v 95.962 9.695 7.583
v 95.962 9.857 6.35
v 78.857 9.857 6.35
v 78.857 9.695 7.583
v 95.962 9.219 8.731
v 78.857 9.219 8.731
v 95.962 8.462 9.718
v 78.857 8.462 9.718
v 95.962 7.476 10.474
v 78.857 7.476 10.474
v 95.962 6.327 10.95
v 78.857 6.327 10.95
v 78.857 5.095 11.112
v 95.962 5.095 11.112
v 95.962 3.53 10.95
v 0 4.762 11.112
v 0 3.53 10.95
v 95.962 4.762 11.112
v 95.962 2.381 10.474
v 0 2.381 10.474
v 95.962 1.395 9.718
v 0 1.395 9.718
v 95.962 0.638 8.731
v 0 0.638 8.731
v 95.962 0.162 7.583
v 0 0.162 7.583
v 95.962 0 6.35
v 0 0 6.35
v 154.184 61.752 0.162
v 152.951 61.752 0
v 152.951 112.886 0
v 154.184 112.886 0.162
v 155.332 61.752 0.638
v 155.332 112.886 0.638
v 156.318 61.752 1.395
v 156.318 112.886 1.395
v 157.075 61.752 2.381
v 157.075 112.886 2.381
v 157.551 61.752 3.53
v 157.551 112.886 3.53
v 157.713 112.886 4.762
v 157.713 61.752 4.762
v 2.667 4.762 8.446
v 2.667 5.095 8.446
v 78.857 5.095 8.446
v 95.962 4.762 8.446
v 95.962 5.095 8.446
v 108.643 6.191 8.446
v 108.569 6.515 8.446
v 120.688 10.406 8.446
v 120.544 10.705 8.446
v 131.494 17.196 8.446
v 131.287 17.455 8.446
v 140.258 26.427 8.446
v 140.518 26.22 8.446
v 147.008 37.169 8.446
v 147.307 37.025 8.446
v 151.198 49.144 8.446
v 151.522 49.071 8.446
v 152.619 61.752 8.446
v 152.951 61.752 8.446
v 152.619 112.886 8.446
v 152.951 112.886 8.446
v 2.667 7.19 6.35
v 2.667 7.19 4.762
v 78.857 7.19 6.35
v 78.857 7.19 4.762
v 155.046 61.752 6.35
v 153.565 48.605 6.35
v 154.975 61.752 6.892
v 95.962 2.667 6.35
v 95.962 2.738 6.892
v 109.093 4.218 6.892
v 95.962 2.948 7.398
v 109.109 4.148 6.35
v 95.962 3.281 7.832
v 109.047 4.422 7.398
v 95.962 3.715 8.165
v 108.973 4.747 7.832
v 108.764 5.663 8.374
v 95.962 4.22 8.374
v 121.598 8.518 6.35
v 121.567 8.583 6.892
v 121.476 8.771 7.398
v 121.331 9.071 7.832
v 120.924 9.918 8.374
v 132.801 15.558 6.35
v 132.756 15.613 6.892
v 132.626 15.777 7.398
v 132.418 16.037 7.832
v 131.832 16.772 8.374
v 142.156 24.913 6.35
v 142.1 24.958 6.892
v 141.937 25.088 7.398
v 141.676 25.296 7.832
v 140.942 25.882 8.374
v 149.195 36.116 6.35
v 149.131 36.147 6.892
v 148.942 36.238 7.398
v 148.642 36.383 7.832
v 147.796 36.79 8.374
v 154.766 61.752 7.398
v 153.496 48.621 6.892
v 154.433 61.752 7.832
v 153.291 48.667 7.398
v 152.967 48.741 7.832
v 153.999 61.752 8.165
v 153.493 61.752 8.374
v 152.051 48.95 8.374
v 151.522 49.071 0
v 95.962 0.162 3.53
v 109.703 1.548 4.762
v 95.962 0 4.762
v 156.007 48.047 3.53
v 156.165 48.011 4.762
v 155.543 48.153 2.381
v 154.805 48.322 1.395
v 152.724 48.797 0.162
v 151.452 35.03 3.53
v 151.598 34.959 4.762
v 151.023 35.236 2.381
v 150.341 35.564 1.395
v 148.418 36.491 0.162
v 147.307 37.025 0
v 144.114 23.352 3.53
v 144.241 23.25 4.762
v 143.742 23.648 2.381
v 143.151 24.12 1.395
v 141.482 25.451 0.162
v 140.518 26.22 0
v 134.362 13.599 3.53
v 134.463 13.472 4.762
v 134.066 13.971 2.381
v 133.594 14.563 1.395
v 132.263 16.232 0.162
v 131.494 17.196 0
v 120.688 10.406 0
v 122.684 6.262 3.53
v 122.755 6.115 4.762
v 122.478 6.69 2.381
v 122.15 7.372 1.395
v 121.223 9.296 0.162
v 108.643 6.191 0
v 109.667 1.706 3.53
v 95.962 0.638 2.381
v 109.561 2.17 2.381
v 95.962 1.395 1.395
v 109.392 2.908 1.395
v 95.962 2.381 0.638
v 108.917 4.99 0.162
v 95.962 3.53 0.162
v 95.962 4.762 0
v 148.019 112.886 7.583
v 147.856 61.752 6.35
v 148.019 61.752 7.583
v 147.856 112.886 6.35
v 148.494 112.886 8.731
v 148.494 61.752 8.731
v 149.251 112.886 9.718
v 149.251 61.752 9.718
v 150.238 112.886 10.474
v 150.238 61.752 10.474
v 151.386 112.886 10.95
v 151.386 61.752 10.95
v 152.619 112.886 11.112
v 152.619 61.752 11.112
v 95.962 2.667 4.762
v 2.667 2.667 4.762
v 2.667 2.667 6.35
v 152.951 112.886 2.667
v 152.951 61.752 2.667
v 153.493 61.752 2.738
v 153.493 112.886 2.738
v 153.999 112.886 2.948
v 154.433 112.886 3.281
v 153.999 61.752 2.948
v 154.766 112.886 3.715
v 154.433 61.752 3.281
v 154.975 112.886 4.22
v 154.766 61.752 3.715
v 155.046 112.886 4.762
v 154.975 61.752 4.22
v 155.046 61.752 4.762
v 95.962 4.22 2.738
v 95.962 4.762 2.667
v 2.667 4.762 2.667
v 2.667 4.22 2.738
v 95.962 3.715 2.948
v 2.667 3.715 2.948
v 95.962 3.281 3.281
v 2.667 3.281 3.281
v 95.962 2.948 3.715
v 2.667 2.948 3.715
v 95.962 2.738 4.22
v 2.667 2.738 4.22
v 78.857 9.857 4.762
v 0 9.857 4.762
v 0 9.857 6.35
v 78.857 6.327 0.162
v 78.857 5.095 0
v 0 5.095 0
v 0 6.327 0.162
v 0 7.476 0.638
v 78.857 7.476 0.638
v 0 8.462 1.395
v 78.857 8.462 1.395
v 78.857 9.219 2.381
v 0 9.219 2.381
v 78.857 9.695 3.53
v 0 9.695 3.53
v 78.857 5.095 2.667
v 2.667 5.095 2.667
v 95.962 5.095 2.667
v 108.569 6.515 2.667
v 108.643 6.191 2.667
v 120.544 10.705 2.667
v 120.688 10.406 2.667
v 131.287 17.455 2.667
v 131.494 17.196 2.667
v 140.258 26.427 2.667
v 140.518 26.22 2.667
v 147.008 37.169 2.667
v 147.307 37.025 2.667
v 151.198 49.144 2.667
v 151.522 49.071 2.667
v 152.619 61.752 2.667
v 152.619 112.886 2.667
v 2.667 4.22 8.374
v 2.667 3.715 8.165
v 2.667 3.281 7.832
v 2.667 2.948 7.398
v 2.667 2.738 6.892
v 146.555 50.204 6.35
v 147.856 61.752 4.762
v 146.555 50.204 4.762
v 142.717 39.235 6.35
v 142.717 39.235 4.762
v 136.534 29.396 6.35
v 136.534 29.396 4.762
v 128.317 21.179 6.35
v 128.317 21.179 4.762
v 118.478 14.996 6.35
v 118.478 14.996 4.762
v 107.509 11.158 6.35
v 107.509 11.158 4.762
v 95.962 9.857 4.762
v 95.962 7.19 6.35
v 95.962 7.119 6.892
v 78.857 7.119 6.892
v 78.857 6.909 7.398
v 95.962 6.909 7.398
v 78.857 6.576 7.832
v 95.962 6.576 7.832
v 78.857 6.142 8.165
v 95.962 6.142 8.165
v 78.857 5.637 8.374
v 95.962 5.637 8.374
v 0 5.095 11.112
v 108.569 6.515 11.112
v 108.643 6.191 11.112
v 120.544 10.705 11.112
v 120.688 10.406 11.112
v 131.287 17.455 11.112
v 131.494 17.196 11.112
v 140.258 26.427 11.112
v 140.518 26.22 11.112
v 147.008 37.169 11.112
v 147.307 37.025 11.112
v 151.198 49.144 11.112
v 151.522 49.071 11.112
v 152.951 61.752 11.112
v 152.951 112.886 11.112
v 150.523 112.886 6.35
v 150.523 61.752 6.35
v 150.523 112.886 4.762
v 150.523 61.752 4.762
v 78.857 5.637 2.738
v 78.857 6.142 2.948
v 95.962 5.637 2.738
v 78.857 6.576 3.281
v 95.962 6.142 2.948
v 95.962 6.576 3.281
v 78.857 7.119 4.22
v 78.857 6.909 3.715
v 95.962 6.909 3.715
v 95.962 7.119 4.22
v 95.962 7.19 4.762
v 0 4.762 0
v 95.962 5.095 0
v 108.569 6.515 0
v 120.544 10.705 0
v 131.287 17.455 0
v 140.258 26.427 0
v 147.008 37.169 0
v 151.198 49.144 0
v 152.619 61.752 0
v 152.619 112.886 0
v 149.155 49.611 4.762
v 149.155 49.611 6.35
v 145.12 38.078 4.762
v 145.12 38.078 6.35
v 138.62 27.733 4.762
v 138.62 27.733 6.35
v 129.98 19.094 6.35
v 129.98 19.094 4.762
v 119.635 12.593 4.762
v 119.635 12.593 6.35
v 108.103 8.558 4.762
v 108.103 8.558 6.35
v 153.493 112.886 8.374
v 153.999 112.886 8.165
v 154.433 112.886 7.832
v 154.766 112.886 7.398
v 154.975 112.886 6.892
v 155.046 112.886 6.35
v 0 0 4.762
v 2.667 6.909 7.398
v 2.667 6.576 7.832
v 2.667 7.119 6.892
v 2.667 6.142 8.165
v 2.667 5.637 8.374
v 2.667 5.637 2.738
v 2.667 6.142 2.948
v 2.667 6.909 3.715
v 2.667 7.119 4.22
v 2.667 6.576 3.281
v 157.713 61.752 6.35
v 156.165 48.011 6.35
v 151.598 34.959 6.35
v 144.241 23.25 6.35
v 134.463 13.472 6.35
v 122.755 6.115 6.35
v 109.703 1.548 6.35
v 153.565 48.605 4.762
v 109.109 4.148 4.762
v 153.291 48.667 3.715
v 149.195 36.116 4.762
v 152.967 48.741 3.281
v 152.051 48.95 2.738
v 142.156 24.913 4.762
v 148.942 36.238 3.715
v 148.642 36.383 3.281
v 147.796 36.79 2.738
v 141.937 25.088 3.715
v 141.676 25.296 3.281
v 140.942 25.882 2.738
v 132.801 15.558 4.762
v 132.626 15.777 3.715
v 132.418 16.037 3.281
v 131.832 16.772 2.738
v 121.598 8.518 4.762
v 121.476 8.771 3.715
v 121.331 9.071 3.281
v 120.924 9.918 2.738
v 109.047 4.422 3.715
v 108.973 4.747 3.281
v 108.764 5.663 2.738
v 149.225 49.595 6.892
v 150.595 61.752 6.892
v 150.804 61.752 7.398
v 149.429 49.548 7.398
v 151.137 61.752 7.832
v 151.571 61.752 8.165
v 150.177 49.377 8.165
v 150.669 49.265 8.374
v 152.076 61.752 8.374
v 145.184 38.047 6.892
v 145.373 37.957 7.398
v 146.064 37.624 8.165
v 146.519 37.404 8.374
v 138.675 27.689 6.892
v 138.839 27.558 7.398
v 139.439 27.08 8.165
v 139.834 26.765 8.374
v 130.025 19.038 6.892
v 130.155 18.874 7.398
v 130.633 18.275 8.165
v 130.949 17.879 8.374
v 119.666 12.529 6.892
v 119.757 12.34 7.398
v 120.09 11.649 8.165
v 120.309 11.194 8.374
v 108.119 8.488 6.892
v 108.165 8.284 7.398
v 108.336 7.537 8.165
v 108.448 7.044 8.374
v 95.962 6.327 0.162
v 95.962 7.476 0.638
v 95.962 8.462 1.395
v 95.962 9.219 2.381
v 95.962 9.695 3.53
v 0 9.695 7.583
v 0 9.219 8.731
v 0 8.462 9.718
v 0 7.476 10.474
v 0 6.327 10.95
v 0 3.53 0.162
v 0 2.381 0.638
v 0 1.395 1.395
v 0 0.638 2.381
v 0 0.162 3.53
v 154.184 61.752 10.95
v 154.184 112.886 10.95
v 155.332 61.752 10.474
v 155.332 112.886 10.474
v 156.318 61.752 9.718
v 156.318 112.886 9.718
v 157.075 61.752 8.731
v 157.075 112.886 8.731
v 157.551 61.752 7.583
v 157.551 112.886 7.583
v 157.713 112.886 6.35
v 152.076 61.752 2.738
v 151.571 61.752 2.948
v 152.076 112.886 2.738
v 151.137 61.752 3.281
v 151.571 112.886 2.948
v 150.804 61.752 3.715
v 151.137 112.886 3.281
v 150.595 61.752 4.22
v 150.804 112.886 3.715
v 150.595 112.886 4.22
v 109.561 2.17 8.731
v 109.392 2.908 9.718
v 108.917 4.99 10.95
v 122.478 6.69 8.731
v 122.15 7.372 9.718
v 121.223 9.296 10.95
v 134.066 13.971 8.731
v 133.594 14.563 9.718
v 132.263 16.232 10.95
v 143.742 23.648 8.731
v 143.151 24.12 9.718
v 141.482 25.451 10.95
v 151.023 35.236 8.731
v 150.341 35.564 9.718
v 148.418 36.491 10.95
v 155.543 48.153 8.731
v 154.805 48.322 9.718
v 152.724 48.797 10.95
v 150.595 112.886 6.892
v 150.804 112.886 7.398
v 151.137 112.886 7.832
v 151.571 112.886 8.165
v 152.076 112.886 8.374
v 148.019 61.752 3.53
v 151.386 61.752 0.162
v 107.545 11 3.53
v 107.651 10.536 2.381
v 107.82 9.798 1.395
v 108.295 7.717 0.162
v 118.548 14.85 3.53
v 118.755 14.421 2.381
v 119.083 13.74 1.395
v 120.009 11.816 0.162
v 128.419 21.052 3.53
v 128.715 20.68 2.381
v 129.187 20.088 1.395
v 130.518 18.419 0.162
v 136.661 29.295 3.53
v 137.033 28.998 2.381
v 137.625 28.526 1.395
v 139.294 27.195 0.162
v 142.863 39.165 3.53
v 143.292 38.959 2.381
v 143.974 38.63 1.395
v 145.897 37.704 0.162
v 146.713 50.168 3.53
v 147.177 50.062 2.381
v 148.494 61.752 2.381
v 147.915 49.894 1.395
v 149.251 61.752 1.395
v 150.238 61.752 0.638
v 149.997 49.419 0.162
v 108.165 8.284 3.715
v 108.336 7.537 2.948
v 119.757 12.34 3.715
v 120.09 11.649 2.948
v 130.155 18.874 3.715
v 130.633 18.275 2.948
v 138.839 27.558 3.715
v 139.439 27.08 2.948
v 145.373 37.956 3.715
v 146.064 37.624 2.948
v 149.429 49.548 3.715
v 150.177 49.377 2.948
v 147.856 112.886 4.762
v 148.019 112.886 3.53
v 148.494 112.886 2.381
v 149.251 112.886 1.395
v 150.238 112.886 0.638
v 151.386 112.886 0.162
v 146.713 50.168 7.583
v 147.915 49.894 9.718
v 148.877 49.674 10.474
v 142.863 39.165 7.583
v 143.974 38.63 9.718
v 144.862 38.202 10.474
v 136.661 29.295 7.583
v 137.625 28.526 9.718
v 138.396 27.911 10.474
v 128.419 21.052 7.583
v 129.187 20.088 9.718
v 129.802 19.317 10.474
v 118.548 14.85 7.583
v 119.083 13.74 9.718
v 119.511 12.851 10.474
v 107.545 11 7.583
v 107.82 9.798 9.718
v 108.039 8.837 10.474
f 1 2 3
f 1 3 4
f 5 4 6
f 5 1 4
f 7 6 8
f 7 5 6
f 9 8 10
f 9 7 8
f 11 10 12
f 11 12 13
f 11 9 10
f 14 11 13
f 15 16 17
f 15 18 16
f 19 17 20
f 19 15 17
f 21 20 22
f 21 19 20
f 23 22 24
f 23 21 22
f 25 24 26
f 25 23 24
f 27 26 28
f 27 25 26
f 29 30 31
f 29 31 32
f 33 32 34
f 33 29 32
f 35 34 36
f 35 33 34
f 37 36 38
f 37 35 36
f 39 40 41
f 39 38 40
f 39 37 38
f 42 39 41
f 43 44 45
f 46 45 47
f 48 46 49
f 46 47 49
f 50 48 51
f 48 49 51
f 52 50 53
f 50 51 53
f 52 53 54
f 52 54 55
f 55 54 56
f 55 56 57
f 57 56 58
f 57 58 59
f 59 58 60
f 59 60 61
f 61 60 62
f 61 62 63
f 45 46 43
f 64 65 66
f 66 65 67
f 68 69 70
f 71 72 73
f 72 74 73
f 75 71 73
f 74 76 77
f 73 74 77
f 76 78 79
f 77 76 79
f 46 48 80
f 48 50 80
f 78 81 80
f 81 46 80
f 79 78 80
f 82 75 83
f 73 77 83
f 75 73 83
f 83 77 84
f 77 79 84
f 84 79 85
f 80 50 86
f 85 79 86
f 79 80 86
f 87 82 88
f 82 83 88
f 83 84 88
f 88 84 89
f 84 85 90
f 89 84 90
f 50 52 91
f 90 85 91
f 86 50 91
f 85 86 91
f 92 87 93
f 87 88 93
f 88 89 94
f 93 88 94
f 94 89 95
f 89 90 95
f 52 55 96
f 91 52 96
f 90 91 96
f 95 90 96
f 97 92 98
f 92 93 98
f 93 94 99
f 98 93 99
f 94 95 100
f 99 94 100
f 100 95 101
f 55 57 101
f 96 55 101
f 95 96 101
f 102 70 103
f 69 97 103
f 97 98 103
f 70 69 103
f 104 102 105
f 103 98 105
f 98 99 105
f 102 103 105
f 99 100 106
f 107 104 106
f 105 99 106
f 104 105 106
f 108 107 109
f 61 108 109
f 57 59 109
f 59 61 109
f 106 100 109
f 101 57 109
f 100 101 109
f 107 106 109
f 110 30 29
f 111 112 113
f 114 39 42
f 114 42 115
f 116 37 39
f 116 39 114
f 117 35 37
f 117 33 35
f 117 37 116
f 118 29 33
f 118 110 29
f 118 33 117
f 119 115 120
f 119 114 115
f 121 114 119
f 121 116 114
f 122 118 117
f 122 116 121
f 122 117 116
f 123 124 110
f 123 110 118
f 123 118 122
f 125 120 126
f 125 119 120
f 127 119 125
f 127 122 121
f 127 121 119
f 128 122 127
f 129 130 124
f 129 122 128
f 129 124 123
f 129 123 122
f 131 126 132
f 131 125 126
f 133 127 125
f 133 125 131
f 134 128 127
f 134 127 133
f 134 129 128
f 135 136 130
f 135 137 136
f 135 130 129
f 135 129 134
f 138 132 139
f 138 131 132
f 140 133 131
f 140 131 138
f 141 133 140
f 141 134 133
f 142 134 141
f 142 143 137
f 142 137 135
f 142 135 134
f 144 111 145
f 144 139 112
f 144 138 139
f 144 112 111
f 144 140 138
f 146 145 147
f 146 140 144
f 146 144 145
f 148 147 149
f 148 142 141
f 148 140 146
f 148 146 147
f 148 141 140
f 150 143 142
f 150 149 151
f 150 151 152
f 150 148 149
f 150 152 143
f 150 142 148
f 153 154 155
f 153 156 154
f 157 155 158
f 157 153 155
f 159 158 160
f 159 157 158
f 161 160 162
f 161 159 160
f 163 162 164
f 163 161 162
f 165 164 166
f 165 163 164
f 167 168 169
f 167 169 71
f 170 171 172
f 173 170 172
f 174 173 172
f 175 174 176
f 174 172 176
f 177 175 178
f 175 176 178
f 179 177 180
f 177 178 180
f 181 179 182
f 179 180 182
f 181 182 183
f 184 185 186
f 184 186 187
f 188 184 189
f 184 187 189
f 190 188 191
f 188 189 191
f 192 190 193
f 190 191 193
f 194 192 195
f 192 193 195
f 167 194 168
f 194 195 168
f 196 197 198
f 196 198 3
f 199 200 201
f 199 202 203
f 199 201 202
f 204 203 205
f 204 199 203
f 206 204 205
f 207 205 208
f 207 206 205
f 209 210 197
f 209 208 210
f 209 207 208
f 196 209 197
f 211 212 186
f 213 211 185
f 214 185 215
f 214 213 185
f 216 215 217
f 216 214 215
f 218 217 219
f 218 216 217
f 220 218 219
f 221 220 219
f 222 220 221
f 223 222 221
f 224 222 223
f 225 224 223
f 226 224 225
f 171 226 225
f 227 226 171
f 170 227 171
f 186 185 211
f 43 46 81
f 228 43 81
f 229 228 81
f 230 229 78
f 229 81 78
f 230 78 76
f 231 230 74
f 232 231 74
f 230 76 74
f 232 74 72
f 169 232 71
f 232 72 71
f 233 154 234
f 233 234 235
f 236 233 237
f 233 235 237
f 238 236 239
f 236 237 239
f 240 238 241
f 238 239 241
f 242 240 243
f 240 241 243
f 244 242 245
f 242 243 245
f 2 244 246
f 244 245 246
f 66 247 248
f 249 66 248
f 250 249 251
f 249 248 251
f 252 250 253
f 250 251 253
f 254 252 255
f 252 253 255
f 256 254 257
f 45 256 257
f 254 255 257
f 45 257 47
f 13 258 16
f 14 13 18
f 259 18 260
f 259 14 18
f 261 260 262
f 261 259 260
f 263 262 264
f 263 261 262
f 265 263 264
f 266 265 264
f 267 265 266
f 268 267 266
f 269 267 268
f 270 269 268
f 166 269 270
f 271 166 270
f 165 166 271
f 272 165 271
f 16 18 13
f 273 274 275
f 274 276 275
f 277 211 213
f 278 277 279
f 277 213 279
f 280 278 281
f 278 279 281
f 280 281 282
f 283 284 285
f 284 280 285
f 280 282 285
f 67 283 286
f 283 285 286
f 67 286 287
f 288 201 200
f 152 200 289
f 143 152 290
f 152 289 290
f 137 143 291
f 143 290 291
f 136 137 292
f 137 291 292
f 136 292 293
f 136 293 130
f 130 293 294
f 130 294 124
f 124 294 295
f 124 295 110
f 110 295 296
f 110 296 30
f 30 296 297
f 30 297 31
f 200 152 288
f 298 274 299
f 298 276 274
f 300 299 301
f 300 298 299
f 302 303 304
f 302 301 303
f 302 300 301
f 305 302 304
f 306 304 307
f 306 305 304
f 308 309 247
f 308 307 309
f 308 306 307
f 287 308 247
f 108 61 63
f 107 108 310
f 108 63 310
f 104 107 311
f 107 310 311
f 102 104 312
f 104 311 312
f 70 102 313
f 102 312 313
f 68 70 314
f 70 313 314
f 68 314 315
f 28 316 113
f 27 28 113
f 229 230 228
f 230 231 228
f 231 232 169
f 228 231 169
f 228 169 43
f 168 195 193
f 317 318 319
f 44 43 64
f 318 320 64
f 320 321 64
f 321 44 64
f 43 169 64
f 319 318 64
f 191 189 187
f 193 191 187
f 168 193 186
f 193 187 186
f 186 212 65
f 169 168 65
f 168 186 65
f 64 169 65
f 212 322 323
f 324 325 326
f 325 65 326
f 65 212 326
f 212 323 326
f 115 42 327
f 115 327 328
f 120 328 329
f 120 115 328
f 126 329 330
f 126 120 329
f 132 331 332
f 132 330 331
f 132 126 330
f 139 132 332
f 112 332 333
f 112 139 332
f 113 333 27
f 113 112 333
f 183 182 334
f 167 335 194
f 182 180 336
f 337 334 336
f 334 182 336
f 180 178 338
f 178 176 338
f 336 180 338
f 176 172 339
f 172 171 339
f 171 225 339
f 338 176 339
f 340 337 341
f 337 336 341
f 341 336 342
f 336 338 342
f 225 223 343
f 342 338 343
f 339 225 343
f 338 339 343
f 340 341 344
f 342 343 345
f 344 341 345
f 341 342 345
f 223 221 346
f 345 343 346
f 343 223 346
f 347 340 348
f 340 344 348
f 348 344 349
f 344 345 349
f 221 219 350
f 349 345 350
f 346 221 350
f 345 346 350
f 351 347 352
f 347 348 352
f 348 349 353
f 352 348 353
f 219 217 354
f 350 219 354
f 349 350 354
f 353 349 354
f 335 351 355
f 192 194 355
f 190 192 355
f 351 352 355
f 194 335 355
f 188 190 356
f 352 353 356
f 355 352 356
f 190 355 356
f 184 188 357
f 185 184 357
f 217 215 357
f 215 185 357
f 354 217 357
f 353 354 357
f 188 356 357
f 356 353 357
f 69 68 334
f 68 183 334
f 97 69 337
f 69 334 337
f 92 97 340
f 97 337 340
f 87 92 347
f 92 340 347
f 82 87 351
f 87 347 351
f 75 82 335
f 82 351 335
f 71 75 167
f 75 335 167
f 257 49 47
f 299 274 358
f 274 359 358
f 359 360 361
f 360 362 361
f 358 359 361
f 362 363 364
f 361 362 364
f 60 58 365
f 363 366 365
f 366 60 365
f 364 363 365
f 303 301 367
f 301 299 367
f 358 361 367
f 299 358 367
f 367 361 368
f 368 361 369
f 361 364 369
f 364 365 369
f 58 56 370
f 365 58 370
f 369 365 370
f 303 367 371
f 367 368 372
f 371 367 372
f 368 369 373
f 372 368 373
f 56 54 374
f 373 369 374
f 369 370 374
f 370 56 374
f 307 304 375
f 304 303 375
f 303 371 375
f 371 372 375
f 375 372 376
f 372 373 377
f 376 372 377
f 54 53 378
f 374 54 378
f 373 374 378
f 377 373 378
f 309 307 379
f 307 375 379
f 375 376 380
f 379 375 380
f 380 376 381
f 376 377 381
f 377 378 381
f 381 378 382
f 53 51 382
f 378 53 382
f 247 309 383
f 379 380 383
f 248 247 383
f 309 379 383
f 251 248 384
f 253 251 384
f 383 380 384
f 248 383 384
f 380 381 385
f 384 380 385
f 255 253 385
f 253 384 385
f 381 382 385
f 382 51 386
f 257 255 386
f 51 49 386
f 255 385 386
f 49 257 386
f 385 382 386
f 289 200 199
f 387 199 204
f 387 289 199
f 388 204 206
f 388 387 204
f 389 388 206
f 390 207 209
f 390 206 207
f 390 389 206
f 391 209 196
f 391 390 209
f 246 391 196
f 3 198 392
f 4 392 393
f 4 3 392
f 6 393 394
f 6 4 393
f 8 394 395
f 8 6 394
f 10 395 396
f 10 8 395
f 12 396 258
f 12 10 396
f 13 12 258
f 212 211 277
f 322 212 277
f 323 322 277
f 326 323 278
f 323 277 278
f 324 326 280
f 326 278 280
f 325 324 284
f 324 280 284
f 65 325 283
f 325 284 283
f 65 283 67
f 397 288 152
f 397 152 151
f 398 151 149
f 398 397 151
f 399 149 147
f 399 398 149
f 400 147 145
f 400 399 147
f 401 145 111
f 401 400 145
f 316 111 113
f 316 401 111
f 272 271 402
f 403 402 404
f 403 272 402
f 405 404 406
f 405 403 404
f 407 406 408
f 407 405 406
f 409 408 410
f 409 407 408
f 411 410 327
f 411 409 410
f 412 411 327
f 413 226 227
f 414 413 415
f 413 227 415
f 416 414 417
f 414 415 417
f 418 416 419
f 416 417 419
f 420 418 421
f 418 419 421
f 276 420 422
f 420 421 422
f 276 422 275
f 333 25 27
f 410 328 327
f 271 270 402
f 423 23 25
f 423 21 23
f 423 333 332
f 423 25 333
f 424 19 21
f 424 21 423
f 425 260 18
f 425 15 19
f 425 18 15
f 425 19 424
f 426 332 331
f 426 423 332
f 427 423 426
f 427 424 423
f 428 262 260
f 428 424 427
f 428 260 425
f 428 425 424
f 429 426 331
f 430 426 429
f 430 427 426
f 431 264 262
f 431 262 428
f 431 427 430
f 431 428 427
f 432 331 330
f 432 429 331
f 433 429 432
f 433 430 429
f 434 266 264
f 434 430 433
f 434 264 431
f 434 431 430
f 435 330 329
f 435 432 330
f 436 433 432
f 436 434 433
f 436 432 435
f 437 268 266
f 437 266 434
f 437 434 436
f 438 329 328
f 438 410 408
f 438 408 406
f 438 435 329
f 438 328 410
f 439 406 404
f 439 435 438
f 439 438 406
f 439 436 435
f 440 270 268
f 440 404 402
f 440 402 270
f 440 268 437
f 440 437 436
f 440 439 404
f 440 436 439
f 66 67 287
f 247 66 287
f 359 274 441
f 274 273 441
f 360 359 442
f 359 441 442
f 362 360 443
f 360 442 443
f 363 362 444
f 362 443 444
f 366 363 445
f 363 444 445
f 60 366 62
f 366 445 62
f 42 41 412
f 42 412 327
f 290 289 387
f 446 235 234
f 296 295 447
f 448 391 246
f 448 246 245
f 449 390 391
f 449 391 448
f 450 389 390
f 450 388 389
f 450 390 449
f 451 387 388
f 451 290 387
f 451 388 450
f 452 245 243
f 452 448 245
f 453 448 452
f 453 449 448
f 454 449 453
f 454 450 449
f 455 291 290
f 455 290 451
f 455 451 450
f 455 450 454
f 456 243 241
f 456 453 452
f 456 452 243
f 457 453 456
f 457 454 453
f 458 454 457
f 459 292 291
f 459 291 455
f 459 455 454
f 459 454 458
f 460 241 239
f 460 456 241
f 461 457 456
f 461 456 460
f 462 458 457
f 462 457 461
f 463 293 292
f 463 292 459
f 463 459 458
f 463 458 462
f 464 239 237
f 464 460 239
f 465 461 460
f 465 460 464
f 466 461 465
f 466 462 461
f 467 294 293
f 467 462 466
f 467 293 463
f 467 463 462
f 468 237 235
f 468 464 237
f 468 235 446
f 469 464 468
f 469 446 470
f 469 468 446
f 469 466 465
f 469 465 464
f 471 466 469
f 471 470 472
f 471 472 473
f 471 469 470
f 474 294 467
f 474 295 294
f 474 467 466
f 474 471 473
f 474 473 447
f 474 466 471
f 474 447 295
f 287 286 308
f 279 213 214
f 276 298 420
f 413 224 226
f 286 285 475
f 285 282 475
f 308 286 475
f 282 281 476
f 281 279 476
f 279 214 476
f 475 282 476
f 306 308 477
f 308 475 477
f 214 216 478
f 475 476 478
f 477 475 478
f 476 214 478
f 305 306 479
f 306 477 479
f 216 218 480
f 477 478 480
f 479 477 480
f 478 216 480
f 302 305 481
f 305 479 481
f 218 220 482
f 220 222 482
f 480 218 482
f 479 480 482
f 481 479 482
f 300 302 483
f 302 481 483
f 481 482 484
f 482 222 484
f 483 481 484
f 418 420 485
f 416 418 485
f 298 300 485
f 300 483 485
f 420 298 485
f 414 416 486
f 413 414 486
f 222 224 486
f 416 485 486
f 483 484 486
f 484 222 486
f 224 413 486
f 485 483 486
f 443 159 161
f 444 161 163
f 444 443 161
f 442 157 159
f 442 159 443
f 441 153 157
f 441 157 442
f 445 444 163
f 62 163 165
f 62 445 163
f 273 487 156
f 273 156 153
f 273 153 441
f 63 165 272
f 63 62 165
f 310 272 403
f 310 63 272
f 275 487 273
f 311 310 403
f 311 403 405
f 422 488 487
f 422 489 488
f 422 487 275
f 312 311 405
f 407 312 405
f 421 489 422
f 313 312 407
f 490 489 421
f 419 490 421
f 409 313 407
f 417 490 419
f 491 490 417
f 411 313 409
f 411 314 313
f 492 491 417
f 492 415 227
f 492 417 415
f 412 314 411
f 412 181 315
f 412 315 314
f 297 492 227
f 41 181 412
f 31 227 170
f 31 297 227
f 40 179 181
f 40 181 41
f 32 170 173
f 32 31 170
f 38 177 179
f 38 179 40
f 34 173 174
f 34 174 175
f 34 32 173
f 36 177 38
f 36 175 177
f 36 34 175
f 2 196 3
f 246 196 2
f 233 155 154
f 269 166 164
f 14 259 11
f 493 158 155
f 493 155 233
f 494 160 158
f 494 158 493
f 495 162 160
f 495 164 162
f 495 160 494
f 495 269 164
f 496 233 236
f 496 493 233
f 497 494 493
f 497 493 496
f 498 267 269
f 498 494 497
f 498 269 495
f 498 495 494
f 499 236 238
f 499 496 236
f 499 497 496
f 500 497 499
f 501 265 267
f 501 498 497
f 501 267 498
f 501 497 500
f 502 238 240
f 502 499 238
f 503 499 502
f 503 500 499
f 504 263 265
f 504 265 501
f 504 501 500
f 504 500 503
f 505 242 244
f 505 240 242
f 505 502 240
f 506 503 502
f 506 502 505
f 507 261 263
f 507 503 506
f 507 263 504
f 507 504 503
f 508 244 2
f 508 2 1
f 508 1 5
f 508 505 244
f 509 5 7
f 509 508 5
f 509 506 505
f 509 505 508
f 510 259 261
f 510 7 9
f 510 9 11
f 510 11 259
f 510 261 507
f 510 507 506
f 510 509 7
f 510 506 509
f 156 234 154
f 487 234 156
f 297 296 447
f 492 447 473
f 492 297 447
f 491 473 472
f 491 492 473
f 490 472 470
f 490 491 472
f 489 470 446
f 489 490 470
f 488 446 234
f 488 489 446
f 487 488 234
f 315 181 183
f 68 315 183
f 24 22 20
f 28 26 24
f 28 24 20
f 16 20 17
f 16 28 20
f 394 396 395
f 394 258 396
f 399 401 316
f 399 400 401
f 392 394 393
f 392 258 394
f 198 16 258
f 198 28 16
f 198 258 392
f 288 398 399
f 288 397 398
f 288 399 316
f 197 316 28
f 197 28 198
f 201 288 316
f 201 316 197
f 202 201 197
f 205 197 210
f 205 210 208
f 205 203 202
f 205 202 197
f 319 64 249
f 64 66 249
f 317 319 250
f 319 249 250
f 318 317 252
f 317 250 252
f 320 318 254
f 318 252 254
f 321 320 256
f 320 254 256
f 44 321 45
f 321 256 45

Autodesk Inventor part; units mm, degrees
ref_plane "YZ Plane" through (0, 0, 0) normal (1, 0, 0) x (0, 1, 0)
ref_plane "XZ Plane" through (0, 0, 0) normal (0, 1, 0) x (-1, 0, 0)
ref_plane "XY Plane" through (0, 0, 0) normal (0, 0, 1) x (1, 0, 0)
sketch "Sketch1" plane through (0, 0, 0) normal (0, 0, 1) x (1, 0, 0)
  line L0 (0, 0) -> (95.9616, 0)
  line L1 (0, 0) -> (0, 9.8571)
  line L2 (0, 9.8571) -> (78.8567, 9.8571)
  arc A0 (95.9616, 0) -> (157.7134, 61.7524) centre (95.9616, 61.7517) ccw
  line L3 (78.8567, 9.8571) -> (95.9616, 9.8571)
  arc A1 (95.9616, 9.8571) -> (147.8563, 61.7517) centre (95.9616, 61.7517) ccw
  line L4 (147.8563, 61.7517) -> (147.8563, 112.8865)
  line L5 (147.8563, 112.8865) -> (157.7134, 112.8865)
  line L6 (157.7134, 112.8865) -> (157.7134, 61.7524)
extrude "Extrusion1" add sketch "Sketch1" along normal blind 11.1125
fillet "Fillet1" radius 4.7625 12 edges at (132.6567, 25.0567, 0) (147.8563, 87.3191, 0) (39.4283, 9.8571, 0) (132.6567, 25.0567, 11.1125) (147.8563, 87.3191, 11.1125) (39.4283, 9.8571, 11.1125) (139.6269, 18.0869, 11.1125) (157.7134, 87.3194, 11.1125) (47.9808, 0, 11.1125) (157.7134, 87.3194, 0) (47.9808, 0, 0) (139.6269, 18.0869, 0)
shell "Shell1" thickness 2.667 removed faces 1 at (152.8402, 112.8865, 3.175)
properties part number "pipe2"
